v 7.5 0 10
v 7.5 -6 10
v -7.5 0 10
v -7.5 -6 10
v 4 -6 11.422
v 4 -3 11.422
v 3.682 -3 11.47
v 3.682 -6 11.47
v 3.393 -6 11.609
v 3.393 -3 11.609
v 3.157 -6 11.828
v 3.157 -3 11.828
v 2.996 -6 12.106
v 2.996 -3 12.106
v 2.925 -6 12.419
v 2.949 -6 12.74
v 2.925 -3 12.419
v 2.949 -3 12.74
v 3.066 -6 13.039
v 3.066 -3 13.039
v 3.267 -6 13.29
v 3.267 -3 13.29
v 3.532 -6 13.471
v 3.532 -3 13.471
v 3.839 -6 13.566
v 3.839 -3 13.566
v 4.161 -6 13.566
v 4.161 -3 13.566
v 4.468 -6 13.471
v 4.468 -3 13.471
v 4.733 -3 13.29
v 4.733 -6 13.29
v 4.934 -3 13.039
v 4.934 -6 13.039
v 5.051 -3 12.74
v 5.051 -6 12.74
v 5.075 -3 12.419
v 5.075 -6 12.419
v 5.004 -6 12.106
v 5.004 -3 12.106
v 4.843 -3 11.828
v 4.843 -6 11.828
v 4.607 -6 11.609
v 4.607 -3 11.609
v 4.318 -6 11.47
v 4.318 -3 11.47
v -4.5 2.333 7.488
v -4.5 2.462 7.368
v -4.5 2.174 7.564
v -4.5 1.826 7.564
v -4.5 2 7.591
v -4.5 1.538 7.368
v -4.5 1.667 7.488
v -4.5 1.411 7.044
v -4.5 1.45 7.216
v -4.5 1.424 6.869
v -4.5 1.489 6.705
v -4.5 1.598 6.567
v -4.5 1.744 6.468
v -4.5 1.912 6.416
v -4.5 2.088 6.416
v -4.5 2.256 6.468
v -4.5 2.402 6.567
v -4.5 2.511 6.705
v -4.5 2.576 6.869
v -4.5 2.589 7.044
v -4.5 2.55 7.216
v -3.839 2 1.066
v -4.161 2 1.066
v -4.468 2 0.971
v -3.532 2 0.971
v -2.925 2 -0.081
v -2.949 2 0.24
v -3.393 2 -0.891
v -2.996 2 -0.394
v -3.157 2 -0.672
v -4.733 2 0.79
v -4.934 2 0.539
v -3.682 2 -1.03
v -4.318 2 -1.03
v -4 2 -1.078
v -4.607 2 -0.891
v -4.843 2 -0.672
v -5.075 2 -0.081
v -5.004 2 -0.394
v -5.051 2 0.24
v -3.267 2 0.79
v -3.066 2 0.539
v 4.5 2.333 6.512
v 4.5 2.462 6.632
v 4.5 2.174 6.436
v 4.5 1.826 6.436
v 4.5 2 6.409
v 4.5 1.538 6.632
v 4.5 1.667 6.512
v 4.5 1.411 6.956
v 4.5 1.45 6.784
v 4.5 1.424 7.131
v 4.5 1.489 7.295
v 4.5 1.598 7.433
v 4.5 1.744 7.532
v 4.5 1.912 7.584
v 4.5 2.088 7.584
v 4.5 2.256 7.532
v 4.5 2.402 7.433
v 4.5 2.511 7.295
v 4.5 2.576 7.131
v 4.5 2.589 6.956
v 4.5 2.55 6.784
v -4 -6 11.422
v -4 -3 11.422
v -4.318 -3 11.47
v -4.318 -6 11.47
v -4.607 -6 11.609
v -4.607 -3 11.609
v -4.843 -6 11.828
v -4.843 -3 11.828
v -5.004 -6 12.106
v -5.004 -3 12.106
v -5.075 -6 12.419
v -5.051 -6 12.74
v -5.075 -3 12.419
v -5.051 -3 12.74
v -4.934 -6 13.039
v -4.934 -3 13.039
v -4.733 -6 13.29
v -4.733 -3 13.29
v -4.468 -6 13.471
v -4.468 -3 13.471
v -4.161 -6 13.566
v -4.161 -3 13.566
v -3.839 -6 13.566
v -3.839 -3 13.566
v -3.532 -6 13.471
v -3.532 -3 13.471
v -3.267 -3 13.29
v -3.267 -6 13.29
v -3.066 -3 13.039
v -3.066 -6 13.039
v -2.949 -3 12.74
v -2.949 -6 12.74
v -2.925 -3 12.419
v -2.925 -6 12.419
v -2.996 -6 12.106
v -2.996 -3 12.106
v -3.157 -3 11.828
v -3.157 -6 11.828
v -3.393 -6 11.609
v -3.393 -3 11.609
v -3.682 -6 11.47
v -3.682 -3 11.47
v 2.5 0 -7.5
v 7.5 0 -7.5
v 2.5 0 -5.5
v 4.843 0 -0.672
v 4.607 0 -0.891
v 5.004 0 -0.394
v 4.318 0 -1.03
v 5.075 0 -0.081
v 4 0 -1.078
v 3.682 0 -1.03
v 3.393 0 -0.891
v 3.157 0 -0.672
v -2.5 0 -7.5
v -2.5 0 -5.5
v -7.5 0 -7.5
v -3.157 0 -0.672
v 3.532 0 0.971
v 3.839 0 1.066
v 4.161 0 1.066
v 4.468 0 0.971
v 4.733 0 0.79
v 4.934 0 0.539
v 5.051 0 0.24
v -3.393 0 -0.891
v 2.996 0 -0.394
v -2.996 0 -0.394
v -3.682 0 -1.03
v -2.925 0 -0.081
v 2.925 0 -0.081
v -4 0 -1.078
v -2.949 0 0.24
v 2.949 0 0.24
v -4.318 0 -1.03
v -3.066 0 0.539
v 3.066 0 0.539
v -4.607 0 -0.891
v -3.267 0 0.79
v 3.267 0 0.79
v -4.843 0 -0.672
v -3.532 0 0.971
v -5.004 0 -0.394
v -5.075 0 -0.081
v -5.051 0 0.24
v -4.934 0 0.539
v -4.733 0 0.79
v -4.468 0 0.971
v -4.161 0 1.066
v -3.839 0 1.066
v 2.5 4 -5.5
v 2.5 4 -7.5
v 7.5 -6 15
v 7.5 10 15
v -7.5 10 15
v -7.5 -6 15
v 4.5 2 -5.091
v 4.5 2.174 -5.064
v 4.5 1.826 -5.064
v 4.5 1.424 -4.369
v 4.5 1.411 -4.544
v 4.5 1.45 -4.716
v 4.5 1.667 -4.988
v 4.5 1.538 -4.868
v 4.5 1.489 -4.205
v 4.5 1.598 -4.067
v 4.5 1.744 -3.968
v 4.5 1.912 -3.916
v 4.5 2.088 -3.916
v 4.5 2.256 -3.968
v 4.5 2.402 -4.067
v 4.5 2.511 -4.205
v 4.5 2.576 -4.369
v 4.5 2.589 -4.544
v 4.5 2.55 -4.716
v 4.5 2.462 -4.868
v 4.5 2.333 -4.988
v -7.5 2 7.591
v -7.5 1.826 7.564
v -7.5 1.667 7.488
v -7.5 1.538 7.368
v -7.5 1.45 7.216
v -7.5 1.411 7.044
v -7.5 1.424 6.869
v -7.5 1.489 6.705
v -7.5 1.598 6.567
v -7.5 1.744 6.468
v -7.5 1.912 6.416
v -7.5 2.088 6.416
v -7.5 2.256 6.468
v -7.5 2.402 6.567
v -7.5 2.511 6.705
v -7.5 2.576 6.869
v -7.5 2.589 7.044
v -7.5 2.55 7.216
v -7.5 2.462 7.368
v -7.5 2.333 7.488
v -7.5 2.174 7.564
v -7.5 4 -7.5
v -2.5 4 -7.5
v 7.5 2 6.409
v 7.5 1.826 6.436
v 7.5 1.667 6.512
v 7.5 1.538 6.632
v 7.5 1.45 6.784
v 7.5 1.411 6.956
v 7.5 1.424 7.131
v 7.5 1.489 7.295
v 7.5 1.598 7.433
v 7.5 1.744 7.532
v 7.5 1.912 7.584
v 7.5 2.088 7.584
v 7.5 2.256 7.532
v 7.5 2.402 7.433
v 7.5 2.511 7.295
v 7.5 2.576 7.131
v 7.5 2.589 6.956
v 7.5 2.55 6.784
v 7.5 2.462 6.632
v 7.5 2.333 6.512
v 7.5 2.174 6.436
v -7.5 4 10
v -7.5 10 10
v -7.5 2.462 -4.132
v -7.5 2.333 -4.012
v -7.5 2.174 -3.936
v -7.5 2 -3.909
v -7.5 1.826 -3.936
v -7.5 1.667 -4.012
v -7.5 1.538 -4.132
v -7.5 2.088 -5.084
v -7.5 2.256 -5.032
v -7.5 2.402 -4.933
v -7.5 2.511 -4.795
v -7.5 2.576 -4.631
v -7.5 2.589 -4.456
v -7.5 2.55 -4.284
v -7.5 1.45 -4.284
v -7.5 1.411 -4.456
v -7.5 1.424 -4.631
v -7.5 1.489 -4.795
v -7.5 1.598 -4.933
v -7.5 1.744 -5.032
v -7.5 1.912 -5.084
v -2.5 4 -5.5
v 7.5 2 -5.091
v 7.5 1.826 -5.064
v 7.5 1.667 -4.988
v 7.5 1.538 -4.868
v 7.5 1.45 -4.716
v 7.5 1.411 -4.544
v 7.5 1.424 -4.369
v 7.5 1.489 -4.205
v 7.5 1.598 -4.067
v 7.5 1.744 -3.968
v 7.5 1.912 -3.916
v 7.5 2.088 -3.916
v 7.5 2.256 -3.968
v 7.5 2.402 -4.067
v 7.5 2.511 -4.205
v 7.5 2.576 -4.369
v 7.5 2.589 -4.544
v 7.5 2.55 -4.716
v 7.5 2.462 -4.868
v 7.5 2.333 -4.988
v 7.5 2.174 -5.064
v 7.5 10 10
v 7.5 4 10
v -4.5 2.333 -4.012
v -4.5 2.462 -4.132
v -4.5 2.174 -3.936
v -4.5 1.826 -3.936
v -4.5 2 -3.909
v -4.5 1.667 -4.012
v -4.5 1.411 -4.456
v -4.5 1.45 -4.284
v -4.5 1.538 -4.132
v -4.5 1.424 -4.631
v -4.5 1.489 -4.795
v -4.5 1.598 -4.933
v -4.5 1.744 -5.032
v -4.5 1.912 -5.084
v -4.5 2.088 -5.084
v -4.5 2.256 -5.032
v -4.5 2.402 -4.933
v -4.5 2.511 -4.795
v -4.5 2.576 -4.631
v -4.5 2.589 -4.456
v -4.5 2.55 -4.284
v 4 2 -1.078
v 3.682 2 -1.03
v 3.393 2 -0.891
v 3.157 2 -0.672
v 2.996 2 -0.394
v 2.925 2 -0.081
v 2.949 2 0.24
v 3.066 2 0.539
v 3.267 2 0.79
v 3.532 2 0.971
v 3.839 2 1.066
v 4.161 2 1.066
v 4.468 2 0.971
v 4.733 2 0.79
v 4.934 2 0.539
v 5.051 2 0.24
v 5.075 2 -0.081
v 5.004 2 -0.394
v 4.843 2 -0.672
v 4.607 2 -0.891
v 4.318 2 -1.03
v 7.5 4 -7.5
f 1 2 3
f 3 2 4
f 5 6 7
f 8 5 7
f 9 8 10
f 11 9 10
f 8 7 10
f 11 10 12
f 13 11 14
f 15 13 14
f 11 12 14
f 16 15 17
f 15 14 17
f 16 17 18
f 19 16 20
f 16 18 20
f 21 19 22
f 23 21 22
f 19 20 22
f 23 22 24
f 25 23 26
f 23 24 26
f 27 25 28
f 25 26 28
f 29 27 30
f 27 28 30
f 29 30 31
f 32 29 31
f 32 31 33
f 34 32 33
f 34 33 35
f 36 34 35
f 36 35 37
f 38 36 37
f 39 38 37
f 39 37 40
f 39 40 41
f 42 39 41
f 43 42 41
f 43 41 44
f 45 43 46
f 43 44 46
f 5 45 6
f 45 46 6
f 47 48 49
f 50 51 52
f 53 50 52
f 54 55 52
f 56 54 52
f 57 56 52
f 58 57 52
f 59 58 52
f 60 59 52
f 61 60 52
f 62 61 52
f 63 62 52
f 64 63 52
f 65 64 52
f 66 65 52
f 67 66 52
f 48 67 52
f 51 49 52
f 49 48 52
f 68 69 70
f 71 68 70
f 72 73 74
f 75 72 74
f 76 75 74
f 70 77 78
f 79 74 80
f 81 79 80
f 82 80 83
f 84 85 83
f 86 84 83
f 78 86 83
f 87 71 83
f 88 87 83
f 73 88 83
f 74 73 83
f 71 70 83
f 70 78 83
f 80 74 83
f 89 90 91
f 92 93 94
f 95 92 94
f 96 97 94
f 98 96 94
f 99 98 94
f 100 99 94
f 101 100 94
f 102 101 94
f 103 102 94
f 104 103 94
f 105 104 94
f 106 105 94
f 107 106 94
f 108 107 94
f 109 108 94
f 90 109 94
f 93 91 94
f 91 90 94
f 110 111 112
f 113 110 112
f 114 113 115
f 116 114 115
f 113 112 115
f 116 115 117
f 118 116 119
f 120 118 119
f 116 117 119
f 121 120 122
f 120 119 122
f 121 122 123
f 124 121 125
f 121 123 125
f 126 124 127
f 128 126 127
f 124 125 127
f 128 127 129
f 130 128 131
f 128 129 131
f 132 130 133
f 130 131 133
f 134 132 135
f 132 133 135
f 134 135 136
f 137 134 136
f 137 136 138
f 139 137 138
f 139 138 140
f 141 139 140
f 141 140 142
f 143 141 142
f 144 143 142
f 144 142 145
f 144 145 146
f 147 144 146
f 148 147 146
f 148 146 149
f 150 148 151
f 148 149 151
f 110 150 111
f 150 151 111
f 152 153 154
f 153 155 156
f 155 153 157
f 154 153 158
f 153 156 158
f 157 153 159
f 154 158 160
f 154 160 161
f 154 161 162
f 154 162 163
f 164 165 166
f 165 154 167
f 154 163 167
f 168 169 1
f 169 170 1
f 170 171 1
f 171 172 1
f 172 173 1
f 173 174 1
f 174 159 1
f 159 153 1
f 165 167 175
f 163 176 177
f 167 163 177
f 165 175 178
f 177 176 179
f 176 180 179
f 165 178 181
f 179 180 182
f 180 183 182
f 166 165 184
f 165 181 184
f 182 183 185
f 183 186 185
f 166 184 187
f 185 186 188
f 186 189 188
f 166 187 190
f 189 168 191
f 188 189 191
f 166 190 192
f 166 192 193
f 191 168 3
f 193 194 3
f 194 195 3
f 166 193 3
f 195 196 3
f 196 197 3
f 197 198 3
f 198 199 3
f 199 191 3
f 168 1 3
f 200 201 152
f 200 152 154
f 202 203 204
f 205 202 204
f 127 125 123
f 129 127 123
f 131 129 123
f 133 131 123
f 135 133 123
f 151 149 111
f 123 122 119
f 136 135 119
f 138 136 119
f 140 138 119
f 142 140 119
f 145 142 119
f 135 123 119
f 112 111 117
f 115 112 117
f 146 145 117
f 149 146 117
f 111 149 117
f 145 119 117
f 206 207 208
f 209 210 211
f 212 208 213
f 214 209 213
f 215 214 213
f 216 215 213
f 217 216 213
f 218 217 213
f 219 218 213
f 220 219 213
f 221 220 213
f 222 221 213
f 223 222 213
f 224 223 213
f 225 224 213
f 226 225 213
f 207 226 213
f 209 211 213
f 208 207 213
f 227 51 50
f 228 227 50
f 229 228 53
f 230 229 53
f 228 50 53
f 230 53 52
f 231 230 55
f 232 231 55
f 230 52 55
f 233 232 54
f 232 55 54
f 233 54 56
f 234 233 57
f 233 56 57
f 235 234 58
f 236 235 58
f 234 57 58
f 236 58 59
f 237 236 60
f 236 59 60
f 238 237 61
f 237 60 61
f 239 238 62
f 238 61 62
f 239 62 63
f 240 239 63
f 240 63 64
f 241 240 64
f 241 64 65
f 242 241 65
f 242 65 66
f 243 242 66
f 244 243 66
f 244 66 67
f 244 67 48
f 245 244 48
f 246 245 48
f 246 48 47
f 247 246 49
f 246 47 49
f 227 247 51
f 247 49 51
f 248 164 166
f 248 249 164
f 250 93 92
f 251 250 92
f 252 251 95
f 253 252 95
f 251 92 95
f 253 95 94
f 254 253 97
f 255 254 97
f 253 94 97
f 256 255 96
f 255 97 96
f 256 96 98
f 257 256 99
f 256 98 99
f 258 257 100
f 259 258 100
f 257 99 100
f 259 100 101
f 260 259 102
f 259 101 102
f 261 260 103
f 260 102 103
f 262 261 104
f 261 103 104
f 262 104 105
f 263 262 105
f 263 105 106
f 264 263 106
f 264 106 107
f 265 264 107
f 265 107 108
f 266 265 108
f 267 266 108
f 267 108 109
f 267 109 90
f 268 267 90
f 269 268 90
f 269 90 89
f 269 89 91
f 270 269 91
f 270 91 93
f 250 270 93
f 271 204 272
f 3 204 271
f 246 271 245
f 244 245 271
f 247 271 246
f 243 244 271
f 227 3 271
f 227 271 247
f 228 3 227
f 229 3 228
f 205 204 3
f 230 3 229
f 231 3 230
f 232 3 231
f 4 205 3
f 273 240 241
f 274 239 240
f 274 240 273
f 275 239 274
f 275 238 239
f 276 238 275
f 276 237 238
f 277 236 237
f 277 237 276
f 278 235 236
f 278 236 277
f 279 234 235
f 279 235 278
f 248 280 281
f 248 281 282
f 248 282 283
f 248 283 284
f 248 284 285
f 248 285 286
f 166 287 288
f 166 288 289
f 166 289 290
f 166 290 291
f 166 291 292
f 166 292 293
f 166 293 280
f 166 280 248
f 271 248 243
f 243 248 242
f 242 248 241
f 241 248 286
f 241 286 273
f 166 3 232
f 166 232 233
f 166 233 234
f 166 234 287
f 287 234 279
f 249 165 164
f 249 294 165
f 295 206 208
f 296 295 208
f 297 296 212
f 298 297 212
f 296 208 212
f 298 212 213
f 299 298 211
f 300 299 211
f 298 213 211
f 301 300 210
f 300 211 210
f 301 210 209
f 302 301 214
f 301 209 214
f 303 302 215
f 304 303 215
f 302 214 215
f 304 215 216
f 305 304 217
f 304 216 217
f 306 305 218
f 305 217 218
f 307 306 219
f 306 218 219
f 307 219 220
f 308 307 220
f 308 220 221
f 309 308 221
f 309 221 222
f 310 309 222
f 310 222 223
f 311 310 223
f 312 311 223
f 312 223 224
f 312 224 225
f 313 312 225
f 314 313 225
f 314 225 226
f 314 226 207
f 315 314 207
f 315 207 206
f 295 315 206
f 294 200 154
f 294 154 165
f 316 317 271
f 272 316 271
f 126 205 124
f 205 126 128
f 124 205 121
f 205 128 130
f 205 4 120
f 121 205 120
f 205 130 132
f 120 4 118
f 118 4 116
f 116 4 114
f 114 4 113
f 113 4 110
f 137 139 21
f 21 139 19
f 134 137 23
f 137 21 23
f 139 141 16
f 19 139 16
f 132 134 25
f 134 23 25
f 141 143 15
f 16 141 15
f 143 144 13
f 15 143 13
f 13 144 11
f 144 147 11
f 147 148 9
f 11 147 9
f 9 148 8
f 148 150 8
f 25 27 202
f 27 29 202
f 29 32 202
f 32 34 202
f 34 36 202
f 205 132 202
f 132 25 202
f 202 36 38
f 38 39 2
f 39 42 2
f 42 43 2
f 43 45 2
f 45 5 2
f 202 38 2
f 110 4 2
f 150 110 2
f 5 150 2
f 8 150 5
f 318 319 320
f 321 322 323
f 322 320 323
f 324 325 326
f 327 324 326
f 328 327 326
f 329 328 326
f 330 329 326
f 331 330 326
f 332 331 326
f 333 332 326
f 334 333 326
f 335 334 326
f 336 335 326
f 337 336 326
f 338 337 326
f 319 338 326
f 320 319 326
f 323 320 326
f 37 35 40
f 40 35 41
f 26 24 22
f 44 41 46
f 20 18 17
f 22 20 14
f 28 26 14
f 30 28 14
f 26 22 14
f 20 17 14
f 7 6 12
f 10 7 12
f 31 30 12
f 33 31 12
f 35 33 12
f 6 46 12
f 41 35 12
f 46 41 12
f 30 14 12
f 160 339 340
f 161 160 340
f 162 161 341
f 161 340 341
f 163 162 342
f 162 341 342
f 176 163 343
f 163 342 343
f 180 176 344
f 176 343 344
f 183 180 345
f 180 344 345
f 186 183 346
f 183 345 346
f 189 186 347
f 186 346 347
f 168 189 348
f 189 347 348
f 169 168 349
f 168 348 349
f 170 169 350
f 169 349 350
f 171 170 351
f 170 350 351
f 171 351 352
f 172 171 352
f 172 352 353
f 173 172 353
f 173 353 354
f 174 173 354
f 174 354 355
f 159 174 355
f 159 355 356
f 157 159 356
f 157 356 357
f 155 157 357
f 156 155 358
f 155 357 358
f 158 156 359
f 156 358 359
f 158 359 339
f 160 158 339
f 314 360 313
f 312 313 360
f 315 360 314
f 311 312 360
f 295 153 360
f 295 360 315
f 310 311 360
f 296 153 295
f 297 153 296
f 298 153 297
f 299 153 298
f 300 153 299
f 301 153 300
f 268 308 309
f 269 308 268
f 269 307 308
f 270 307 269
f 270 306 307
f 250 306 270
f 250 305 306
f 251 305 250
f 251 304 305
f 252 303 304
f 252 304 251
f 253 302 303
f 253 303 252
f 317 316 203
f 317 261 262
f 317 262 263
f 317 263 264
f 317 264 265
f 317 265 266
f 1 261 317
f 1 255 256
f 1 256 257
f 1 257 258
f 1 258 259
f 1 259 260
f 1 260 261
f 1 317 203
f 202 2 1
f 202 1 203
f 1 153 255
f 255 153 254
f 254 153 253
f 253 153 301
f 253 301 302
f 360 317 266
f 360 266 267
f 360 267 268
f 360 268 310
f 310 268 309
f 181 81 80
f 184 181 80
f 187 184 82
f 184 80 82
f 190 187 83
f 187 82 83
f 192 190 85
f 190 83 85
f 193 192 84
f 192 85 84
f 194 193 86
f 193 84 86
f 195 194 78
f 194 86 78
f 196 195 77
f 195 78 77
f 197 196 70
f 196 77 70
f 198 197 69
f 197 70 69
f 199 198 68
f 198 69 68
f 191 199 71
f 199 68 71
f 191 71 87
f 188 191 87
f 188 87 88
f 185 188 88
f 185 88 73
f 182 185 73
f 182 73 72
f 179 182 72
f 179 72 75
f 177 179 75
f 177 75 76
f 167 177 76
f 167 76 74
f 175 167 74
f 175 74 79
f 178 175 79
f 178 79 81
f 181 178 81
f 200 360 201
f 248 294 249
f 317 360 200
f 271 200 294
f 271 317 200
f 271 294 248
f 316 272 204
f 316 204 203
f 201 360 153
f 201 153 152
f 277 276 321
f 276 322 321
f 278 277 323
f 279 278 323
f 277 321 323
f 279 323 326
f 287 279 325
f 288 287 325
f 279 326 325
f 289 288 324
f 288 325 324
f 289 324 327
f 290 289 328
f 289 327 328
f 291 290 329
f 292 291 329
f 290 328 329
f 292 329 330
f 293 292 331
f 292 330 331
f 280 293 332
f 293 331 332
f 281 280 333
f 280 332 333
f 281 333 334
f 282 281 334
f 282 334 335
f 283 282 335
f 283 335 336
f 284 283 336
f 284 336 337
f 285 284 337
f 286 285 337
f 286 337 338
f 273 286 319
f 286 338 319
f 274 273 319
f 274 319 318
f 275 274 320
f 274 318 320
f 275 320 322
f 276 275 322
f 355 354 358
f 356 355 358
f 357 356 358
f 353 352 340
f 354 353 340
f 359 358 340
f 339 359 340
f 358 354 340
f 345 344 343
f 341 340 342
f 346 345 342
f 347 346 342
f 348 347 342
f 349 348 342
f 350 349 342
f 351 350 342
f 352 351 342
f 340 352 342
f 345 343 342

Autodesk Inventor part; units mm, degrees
ref_plane "YZ Plane" through (0, 0, 0) normal (1, 0, 0) x (0, 1, 0)
ref_plane "XZ Plane" through (0, 0, 0) normal (0, 1, 0) x (-1, 0, 0)
ref_plane "XY Plane" through (0, 0, 0) normal (0, 0, 1) x (1, 0, 0)
sketch "Sketch1" plane through (0, 0, 0) normal (0, 1, 0) x (-1, 0, 0)
  line L0 (-7.5, 15) -> (7.5, 15)
  line L1 (7.5, 15) -> (7.5, -15)
  line L2 (7.5, -15) -> (-7.5, -15)
  line L3 (-7.5, -15) -> (-7.5, 15)
  line L4 (-7.5, 15) -> (7.5, -15) construction
  line L5 (7.5, 15) -> (-7.5, -15) construction
  point P0 (0, 0)
  dimension "d0" = 15
  dimension "d1" = 30
extrude "Extrusion1" add sketch "Sketch1" along normal blind 4
chamfer "Chamfer1" distance 2.5 distance2 1 1 edges at (7.5, 2, -15) measured on face at (7.5, 1.3333, 5)
chamfer "Chamfer2" distance 1 distance2 2.5 1 edges at (-7.5, 2, -15) measured on face at (1.8333, 2.6667, -15)
sketch "Sketch3" plane through (0, 0, 0) normal (0, -1, 0) x (1, 0, 0)
  line L0 (0, 0) -> (4, 0)
  line L1 (0, 0) -> (-4, 0)
  dimension "d14" = 4
  dimension "d15" = 4
hole "Hole1" at (4, 0, 0) at (-4, 0, 0) direction (0, 1, 0) diameter 2.1565 depth 2 thread size "4-40 UNC" class "2B" standard "ANSI Unified Screw Threads"
sketch "Sketch4" plane through (0, 0, 0) normal (0, -1, 0) x (1, 0, 0)
  line L0 (7.5, 15) -> (7.5, -12.5) projected
  line L1 (7.5, -12.5) -> (7.5, -7.5)
  line L2 (7.5, -7.5) -> (2.5, -7.5)
  line L3 (2.5, -7.5) -> (2.5, -5.5)
  line L4 (2.5, -5.5) -> (-2.5, -5.5)
  line L5 (-2.5, -5.5) -> (-2.5, -7.5)
  line L6 (-2.5, -7.5) -> (-7.5679, -7.5)
  line L7 (-7.5679, -7.5) -> (-7.5679, -12.5)
  line L8 (6.5, -15) -> (-6.5, -15) projected
  line L9 (-7.5679, -12.5) -> (-6.5, -15)
  line L10 (7.5, -12.5) -> (6.5, -15) projected
  line L11 (-6.5, -15) -> (6.5, -15)
  line L12 (6.5, -15) -> (7.5, -12.5)
  point P0 (0, 0)
  dimension "d23" = 5
  dimension "d24" = 5
  dimension "d25" = 2
  dimension "d26" = 5
split body "Split1" sketch "Sketch4" result one side removed curves L2 L3 L4 L5 L6 L7 L9 L11 L12 L1 removed pieces at (0.8333, 0.5, -12.5)
sketch "Sketch5" plane through (0, 4, 0) normal (0, 1, 0) x (1, 0, 0)
  line L0 (-7.5, 7.5) -> (-7.5, -15) projected
  line L1 (7.5, -15) -> (7.5, 7.5) projected
  line L2 (-7.5, -15) -> (7.5, -15)
  line L3 (7.5, -15) -> (7.5, -10)
  line L4 (7.5, -10) -> (-7.5, -10)
  line L5 (-7.5, -10) -> (-7.5, -15)
  point P0 (0, 0)
  dimension "d27" = 5
extrude "Extrusion3" add sketch "Sketch5" along normal blind 6 and the other way blind 10
sketch "Sketch6" plane through (7.5, 0, -7.5) normal (1, 0, 0) x (0, 0, -1)
  line L0 (0, 4) -> (0, 0) projected
  line L1 (0, 2) -> (-3, 2)
  line L2 (-17.5, 2) -> (-14.5, 2)
  point P0 (-7.5, 0)
  dimension "d38" = 3
  dimension "d39" = 3
hole "Hole2" at (7.5, 2, 7) at (7.5, 2, -4.5) direction (-1, 0, 0) diameter 1.1811 depth 3 thread size "0-80 UNF" class "2B" standard "ANSI Unified Screw Threads"
sketch "Sketch7" plane through (-7.5, 0, -7.5) normal (-1, 0, 0) x (0, 0, 1)
  circle A0 centre (3, 2) radius 0.5906 projected
  circle A1 centre (14.5, 2) radius 0.5906 projected
  point P0 (7.5, 0)
hole "Hole3" at (-7.5, 2, 7) at (-7.5, 2, -4.5) direction (1, 0, 0) diameter 1.1811 depth 3 thread size "0-80 UNF" class "2B" standard "ANSI Unified Screw Threads"
sketch "Sketch8" plane through (0, -6, 0) normal (0, -1, 0) x (1, 0, 0)
  line L0 (7.5, 10) -> (7.5, 15) projected
  line L1 (7.5, 12.5) -> (4, 12.5)
  line L2 (-7.5, 10) -> (-7.5, 15) projected
  line L3 (-7.5, 12.5) -> (-4, 12.5)
  point P0 (0, 0)
  dimension "d54" = 3.5
  dimension "d55" = 3.5
hole "Hole4" at (4, -6, 12.5) at (-4, -6, 12.5) direction (0, 1, 0) diameter 2.1565 depth 3 thread size "4-40 UNC" class "2B" standard "ANSI Unified Screw Threads"
properties part number "copper_thermal_contact" material "Copper"
